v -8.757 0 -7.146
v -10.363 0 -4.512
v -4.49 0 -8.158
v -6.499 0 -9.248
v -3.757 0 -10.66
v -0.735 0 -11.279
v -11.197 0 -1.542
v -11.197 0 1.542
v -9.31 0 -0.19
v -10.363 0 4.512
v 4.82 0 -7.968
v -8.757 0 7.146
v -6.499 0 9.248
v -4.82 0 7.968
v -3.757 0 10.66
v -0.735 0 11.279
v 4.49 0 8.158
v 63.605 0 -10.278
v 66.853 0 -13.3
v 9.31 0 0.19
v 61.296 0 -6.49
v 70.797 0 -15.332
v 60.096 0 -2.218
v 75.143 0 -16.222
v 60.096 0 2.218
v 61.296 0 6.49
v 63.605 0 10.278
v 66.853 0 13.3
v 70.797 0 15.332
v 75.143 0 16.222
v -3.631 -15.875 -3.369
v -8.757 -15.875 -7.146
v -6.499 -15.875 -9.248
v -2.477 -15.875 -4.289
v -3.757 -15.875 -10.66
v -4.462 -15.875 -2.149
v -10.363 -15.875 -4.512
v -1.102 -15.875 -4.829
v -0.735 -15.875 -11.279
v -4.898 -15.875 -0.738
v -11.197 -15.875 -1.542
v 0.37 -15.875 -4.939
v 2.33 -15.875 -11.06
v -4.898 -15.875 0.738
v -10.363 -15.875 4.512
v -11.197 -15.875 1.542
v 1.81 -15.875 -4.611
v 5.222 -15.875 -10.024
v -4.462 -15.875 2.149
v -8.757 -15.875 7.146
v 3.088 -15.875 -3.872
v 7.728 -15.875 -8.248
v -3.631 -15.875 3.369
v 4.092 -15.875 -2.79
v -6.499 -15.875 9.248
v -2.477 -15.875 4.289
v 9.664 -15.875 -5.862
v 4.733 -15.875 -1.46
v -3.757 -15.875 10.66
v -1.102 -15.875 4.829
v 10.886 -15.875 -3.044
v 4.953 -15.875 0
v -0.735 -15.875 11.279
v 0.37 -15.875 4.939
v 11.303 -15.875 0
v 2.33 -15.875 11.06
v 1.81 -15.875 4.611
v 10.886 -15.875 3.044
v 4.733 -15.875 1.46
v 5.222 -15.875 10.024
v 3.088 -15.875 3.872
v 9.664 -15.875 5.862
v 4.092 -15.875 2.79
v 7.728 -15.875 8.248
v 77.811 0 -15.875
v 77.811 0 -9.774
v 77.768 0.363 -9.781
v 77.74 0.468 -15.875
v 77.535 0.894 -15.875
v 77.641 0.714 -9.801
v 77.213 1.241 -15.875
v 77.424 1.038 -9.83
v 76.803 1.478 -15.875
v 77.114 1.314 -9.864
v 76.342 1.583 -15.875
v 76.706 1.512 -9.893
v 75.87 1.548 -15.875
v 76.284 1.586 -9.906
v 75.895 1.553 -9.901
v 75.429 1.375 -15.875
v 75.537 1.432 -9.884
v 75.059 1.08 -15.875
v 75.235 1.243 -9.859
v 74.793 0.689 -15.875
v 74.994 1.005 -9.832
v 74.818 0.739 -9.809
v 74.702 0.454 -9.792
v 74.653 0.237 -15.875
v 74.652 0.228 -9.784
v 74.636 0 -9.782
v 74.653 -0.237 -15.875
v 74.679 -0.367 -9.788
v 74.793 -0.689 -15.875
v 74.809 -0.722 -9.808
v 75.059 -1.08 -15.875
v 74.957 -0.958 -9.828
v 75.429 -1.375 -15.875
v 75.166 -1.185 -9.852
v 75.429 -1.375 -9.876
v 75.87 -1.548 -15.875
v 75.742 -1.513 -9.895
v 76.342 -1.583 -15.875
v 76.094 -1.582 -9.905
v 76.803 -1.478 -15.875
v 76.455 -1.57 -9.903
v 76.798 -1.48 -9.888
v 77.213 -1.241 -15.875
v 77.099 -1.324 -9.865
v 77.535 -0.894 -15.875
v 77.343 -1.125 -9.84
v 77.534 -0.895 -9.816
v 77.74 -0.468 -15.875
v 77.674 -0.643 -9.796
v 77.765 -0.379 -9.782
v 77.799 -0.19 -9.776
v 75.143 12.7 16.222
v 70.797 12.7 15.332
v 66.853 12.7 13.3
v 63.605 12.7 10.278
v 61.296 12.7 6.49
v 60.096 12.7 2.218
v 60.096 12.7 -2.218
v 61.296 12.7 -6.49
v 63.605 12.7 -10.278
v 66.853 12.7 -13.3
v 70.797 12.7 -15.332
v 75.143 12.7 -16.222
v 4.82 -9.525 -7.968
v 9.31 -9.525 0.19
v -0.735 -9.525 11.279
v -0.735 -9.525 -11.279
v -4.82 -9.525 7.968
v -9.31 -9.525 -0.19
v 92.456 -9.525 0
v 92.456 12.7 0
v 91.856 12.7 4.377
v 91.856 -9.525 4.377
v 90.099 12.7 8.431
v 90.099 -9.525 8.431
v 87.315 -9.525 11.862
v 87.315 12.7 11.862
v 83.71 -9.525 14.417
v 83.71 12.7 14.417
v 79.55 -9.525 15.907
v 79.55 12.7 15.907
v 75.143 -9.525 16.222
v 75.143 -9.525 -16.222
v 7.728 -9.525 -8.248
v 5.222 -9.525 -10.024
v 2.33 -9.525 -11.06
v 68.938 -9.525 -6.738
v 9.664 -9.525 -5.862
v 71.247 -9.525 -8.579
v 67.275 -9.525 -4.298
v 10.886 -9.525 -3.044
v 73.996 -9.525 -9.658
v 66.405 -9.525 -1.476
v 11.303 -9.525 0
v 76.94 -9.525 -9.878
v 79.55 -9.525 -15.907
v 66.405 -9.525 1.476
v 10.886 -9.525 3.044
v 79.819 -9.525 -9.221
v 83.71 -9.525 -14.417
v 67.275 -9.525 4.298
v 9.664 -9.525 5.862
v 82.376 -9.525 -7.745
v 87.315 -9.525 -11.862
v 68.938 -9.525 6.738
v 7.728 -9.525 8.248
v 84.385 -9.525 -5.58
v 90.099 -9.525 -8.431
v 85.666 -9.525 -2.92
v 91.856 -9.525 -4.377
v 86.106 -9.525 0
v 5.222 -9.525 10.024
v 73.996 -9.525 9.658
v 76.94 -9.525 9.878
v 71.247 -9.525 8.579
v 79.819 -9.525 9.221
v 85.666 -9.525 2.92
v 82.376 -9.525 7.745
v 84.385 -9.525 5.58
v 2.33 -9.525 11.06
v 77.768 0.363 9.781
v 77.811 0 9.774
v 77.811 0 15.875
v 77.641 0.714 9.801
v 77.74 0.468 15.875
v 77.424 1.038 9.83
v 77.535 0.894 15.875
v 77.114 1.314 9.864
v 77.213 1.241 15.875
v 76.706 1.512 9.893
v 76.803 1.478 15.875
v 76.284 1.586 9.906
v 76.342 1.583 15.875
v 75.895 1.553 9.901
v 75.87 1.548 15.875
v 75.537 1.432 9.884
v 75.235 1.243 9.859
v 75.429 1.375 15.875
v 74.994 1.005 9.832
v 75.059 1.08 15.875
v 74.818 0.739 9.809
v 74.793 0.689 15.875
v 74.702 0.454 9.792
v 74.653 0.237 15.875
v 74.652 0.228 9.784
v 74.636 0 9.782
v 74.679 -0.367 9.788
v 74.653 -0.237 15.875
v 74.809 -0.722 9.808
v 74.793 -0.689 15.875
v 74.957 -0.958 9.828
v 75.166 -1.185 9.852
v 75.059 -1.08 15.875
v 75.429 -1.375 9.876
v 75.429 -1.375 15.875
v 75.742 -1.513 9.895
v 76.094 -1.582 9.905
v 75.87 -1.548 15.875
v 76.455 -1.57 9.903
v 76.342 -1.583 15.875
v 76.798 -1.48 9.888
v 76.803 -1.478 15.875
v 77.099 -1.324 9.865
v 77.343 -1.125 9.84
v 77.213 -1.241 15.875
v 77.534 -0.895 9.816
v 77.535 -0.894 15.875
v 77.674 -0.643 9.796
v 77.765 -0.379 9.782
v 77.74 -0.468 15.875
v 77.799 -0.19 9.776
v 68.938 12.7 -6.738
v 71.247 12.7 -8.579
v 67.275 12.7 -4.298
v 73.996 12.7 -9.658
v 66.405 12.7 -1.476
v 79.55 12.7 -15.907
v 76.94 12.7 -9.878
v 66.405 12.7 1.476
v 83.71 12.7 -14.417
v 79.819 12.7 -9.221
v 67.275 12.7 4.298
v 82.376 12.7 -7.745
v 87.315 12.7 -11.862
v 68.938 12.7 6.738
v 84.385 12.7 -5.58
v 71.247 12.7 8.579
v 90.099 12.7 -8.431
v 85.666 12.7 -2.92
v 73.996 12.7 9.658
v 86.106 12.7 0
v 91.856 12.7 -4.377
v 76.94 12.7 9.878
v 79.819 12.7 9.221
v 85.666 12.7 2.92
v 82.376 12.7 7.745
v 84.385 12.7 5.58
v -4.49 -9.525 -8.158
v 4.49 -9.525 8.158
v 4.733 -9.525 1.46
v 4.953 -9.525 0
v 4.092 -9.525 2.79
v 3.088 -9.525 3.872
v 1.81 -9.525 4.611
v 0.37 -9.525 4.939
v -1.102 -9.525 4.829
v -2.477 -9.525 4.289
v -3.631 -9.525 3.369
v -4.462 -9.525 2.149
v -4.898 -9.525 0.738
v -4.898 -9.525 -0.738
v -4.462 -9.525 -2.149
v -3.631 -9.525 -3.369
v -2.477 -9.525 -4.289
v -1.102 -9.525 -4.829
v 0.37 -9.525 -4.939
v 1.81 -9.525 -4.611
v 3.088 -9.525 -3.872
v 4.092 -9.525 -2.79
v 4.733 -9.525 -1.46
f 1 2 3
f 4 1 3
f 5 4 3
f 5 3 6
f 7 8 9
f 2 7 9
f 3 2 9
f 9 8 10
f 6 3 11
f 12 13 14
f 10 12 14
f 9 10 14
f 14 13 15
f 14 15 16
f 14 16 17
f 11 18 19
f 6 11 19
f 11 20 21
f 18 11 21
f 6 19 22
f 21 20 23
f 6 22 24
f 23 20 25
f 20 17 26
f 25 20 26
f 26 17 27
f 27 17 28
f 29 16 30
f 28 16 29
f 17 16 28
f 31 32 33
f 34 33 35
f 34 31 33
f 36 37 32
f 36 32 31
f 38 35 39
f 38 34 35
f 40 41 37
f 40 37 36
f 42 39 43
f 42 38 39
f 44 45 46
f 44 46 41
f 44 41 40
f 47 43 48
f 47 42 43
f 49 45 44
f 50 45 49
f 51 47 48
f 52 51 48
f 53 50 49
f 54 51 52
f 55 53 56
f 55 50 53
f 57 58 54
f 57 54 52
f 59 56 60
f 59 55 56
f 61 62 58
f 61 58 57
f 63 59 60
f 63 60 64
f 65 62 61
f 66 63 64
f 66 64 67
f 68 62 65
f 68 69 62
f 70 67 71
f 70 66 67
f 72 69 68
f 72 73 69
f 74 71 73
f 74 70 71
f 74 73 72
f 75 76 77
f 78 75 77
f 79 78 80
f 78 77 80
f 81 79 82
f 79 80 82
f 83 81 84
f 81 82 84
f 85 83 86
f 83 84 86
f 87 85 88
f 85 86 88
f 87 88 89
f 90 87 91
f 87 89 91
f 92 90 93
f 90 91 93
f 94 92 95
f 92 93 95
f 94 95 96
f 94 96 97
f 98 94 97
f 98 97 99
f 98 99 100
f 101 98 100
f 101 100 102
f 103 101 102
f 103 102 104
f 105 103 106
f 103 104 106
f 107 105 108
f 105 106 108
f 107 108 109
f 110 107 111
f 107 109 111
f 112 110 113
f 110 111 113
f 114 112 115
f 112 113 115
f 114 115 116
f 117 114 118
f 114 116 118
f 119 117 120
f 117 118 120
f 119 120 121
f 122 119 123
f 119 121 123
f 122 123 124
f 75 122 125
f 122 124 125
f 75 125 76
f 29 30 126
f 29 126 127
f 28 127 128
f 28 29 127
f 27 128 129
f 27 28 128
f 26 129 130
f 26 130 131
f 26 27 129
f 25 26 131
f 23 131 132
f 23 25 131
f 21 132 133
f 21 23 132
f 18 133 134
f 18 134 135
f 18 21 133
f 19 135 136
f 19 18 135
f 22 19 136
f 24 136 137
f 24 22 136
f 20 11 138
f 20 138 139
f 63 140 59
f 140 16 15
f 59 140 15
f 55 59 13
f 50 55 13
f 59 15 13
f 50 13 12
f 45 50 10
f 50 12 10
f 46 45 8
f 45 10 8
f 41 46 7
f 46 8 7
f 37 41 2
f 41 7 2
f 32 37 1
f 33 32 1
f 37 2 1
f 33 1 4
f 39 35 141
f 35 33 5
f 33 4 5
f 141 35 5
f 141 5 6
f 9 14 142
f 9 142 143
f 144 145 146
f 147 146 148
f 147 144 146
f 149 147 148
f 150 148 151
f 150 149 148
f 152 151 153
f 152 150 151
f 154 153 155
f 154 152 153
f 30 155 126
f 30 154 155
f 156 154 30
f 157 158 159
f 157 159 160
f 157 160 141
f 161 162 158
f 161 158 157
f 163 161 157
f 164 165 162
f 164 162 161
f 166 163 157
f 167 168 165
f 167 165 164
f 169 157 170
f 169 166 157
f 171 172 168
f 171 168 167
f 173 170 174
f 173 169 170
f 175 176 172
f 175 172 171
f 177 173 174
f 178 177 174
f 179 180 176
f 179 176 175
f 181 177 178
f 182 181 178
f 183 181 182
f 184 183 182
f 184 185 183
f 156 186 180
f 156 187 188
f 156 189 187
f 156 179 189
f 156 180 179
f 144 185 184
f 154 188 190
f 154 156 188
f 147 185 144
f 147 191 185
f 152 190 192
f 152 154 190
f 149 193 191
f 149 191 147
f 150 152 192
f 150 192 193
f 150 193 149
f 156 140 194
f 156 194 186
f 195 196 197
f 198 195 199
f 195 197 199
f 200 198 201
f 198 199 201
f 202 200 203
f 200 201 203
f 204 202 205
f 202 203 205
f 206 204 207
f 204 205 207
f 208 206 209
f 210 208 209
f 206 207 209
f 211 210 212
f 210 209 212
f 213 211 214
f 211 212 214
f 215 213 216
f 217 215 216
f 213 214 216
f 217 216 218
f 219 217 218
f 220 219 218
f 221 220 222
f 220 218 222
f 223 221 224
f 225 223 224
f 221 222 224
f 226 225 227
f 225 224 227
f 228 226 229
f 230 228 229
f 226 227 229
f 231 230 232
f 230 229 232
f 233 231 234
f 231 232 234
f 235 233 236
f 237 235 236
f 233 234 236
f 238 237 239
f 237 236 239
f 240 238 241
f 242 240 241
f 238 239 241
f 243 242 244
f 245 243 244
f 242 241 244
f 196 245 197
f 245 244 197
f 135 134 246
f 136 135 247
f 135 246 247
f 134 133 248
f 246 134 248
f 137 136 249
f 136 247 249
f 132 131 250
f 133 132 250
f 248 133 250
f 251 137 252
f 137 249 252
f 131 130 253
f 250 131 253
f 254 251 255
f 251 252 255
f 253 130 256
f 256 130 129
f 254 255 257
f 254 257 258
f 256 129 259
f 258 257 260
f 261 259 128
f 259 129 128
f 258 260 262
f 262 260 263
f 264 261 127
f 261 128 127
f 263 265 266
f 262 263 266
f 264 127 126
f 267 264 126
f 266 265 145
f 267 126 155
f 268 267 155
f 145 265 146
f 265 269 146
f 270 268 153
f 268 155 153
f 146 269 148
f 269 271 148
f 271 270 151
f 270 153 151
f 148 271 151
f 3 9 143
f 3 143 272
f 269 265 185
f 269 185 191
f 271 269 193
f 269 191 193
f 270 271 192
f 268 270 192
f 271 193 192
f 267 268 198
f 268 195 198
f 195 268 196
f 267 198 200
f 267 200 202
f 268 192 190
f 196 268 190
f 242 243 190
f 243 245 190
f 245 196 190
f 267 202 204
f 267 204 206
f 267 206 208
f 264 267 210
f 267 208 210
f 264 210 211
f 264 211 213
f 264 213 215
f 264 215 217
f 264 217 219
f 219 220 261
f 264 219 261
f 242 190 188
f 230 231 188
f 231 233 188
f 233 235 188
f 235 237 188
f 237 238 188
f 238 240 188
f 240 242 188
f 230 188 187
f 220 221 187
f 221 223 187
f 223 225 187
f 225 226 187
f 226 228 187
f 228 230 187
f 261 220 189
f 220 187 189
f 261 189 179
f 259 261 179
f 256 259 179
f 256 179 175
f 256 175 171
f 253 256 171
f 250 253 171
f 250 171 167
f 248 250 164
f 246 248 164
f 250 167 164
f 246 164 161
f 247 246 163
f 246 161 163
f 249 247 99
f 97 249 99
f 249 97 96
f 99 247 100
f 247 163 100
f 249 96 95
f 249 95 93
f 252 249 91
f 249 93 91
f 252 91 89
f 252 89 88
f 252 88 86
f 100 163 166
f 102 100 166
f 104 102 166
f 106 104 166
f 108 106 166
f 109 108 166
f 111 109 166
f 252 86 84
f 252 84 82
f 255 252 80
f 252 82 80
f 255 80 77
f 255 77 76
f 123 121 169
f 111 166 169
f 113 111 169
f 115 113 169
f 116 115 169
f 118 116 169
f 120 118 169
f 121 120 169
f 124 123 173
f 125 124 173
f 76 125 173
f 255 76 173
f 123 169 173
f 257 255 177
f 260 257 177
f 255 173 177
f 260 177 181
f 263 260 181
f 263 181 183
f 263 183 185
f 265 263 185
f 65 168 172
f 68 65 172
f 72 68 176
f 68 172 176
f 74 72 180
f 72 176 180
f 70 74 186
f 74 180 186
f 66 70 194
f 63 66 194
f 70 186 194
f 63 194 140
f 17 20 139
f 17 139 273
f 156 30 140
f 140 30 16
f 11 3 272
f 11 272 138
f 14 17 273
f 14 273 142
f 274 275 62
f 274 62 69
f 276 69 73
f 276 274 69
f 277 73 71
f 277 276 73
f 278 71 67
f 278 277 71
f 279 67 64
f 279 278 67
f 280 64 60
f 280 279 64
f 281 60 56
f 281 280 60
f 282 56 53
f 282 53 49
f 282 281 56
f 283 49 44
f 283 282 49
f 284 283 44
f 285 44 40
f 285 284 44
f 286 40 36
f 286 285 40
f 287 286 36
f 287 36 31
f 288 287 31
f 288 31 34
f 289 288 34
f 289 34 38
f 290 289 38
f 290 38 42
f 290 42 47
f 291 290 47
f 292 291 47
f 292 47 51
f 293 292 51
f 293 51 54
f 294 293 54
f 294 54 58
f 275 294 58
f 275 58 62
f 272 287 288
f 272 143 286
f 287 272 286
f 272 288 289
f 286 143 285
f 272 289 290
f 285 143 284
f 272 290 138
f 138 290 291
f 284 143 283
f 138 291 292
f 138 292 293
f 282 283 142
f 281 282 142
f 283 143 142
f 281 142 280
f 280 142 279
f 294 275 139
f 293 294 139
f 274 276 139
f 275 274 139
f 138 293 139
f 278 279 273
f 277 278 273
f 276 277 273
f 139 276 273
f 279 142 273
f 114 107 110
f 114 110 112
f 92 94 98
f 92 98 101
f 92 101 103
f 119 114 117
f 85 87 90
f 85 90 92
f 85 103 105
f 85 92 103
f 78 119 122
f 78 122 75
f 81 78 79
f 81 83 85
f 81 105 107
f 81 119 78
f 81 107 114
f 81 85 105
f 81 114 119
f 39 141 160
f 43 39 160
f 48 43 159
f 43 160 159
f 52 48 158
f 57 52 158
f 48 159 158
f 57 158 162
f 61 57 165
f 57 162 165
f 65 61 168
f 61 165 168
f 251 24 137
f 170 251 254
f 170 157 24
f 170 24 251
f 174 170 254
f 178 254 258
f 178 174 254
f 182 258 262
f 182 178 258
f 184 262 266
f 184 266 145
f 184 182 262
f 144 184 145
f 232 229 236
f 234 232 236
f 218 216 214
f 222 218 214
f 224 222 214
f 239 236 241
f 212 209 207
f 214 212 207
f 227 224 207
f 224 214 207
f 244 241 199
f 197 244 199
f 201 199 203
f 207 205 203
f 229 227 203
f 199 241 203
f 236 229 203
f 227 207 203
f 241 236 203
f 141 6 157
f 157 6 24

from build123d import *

# Parameters (mm, degrees)
F0_R     = 4.953
F1_DEPTH = 15.875
F0_R_2   = 9.906
F2_DEPTH = 9.525
F3_DEPTH = 12.7
F5_DEPTH = 9.525
F6_R     = 1.5875
F7_DEPTH = 15.875


with BuildPart() as f1:
    # F0 (on Front) → F1 (new body)
    with BuildSketch(Plane.XZ):
        with BuildLine():
            ThreePointArc((-0.734695, -11.279097), (7.72831, -8.248093), (11.303, 0))
            ThreePointArc((11.303, 0), (7.72831, 8.248093), (-0.734695, 11.279097))
            ThreePointArc((-0.734695, 11.279097), (-11.303, 0), (-0.734695, -11.279097))
        make_face()
        Circle(F0_R, mode=Mode.SUBTRACT)
    extrude(amount=F1_DEPTH)

    # F0 (on Front) → F2 (join)
    with BuildSketch(Plane.XZ):
        with BuildLine():
            ThreePointArc((-0.734695, -11.279097), (7.72831, -8.248093), (11.303, 0))
            ThreePointArc((11.303, 0), (7.72831, 8.248093), (-0.734695, 11.279097))
            ThreePointArc((-0.734695, 11.279097), (-11.303, 0), (-0.734695, -11.279097))
        make_face()
        Circle(F0_R, mode=Mode.SUBTRACT)
        with BuildLine():
            ThreePointArc((-0.734695, 11.279097), (7.72831, 8.248093), (11.303, 0))
            ThreePointArc((11.303, 0), (7.72831, -8.248093), (-0.734695, -11.279097))
            Line((-0.734695, -11.279097), (75.14336, -16.221623))
            ThreePointArc((75.14336, -16.221623), (59.944, 0), (75.14336, 16.221623))
            Line((75.14336, 16.221623), (-0.734695, 11.279097))
        make_face()
        with BuildLine():
            ThreePointArc((92.456, 0), (87.314873, 11.862425), (75.14336, 16.221623))
            ThreePointArc((75.14336, 16.221623), (59.944, 0), (75.14336, -16.221623))
            ThreePointArc((75.14336, -16.221623), (87.314873, -11.862425), (92.456, 0))
        make_face()
        with Locations((76.2, 0)):
            Circle(F0_R_2, mode=Mode.SUBTRACT)
    extrude(amount=F2_DEPTH)

    # F0 (on Front) → F3 (join)
    with BuildSketch(Plane.XZ):
        with BuildLine():
            ThreePointArc((92.456, 0), (87.314873, 11.862425), (75.14336, 16.221623))
            ThreePointArc((75.14336, 16.221623), (59.944, 0), (75.14336, -16.221623))
            ThreePointArc((75.14336, -16.221623), (87.314873, -11.862425), (92.456, 0))
        make_face()
        with Locations((76.2, 0)):
            Circle(F0_R_2, mode=Mode.SUBTRACT)
    extrude(amount=-F3_DEPTH)

    # F4 (on Front) → F5 (cut)
    with BuildSketch(Plane.XZ):
        Polygon((-4.819749, 7.967741), (-9.310141, -0.190155), (-4.490392, -8.157896), (4.819749, -7.967741), (9.310141, 0.190155), (4.490392, 8.157896), align=None)
    extrude(amount=F5_DEPTH, mode=Mode.SUBTRACT)

    # F6 (on Top) → F7 (cut, symmetric)
    with BuildSketch(Plane.XY):
        with Locations((76.223016, 0)):
            Circle(F6_R)
    extrude(amount=F7_DEPTH, both=True, mode=Mode.SUBTRACT)


solid = f1.part
